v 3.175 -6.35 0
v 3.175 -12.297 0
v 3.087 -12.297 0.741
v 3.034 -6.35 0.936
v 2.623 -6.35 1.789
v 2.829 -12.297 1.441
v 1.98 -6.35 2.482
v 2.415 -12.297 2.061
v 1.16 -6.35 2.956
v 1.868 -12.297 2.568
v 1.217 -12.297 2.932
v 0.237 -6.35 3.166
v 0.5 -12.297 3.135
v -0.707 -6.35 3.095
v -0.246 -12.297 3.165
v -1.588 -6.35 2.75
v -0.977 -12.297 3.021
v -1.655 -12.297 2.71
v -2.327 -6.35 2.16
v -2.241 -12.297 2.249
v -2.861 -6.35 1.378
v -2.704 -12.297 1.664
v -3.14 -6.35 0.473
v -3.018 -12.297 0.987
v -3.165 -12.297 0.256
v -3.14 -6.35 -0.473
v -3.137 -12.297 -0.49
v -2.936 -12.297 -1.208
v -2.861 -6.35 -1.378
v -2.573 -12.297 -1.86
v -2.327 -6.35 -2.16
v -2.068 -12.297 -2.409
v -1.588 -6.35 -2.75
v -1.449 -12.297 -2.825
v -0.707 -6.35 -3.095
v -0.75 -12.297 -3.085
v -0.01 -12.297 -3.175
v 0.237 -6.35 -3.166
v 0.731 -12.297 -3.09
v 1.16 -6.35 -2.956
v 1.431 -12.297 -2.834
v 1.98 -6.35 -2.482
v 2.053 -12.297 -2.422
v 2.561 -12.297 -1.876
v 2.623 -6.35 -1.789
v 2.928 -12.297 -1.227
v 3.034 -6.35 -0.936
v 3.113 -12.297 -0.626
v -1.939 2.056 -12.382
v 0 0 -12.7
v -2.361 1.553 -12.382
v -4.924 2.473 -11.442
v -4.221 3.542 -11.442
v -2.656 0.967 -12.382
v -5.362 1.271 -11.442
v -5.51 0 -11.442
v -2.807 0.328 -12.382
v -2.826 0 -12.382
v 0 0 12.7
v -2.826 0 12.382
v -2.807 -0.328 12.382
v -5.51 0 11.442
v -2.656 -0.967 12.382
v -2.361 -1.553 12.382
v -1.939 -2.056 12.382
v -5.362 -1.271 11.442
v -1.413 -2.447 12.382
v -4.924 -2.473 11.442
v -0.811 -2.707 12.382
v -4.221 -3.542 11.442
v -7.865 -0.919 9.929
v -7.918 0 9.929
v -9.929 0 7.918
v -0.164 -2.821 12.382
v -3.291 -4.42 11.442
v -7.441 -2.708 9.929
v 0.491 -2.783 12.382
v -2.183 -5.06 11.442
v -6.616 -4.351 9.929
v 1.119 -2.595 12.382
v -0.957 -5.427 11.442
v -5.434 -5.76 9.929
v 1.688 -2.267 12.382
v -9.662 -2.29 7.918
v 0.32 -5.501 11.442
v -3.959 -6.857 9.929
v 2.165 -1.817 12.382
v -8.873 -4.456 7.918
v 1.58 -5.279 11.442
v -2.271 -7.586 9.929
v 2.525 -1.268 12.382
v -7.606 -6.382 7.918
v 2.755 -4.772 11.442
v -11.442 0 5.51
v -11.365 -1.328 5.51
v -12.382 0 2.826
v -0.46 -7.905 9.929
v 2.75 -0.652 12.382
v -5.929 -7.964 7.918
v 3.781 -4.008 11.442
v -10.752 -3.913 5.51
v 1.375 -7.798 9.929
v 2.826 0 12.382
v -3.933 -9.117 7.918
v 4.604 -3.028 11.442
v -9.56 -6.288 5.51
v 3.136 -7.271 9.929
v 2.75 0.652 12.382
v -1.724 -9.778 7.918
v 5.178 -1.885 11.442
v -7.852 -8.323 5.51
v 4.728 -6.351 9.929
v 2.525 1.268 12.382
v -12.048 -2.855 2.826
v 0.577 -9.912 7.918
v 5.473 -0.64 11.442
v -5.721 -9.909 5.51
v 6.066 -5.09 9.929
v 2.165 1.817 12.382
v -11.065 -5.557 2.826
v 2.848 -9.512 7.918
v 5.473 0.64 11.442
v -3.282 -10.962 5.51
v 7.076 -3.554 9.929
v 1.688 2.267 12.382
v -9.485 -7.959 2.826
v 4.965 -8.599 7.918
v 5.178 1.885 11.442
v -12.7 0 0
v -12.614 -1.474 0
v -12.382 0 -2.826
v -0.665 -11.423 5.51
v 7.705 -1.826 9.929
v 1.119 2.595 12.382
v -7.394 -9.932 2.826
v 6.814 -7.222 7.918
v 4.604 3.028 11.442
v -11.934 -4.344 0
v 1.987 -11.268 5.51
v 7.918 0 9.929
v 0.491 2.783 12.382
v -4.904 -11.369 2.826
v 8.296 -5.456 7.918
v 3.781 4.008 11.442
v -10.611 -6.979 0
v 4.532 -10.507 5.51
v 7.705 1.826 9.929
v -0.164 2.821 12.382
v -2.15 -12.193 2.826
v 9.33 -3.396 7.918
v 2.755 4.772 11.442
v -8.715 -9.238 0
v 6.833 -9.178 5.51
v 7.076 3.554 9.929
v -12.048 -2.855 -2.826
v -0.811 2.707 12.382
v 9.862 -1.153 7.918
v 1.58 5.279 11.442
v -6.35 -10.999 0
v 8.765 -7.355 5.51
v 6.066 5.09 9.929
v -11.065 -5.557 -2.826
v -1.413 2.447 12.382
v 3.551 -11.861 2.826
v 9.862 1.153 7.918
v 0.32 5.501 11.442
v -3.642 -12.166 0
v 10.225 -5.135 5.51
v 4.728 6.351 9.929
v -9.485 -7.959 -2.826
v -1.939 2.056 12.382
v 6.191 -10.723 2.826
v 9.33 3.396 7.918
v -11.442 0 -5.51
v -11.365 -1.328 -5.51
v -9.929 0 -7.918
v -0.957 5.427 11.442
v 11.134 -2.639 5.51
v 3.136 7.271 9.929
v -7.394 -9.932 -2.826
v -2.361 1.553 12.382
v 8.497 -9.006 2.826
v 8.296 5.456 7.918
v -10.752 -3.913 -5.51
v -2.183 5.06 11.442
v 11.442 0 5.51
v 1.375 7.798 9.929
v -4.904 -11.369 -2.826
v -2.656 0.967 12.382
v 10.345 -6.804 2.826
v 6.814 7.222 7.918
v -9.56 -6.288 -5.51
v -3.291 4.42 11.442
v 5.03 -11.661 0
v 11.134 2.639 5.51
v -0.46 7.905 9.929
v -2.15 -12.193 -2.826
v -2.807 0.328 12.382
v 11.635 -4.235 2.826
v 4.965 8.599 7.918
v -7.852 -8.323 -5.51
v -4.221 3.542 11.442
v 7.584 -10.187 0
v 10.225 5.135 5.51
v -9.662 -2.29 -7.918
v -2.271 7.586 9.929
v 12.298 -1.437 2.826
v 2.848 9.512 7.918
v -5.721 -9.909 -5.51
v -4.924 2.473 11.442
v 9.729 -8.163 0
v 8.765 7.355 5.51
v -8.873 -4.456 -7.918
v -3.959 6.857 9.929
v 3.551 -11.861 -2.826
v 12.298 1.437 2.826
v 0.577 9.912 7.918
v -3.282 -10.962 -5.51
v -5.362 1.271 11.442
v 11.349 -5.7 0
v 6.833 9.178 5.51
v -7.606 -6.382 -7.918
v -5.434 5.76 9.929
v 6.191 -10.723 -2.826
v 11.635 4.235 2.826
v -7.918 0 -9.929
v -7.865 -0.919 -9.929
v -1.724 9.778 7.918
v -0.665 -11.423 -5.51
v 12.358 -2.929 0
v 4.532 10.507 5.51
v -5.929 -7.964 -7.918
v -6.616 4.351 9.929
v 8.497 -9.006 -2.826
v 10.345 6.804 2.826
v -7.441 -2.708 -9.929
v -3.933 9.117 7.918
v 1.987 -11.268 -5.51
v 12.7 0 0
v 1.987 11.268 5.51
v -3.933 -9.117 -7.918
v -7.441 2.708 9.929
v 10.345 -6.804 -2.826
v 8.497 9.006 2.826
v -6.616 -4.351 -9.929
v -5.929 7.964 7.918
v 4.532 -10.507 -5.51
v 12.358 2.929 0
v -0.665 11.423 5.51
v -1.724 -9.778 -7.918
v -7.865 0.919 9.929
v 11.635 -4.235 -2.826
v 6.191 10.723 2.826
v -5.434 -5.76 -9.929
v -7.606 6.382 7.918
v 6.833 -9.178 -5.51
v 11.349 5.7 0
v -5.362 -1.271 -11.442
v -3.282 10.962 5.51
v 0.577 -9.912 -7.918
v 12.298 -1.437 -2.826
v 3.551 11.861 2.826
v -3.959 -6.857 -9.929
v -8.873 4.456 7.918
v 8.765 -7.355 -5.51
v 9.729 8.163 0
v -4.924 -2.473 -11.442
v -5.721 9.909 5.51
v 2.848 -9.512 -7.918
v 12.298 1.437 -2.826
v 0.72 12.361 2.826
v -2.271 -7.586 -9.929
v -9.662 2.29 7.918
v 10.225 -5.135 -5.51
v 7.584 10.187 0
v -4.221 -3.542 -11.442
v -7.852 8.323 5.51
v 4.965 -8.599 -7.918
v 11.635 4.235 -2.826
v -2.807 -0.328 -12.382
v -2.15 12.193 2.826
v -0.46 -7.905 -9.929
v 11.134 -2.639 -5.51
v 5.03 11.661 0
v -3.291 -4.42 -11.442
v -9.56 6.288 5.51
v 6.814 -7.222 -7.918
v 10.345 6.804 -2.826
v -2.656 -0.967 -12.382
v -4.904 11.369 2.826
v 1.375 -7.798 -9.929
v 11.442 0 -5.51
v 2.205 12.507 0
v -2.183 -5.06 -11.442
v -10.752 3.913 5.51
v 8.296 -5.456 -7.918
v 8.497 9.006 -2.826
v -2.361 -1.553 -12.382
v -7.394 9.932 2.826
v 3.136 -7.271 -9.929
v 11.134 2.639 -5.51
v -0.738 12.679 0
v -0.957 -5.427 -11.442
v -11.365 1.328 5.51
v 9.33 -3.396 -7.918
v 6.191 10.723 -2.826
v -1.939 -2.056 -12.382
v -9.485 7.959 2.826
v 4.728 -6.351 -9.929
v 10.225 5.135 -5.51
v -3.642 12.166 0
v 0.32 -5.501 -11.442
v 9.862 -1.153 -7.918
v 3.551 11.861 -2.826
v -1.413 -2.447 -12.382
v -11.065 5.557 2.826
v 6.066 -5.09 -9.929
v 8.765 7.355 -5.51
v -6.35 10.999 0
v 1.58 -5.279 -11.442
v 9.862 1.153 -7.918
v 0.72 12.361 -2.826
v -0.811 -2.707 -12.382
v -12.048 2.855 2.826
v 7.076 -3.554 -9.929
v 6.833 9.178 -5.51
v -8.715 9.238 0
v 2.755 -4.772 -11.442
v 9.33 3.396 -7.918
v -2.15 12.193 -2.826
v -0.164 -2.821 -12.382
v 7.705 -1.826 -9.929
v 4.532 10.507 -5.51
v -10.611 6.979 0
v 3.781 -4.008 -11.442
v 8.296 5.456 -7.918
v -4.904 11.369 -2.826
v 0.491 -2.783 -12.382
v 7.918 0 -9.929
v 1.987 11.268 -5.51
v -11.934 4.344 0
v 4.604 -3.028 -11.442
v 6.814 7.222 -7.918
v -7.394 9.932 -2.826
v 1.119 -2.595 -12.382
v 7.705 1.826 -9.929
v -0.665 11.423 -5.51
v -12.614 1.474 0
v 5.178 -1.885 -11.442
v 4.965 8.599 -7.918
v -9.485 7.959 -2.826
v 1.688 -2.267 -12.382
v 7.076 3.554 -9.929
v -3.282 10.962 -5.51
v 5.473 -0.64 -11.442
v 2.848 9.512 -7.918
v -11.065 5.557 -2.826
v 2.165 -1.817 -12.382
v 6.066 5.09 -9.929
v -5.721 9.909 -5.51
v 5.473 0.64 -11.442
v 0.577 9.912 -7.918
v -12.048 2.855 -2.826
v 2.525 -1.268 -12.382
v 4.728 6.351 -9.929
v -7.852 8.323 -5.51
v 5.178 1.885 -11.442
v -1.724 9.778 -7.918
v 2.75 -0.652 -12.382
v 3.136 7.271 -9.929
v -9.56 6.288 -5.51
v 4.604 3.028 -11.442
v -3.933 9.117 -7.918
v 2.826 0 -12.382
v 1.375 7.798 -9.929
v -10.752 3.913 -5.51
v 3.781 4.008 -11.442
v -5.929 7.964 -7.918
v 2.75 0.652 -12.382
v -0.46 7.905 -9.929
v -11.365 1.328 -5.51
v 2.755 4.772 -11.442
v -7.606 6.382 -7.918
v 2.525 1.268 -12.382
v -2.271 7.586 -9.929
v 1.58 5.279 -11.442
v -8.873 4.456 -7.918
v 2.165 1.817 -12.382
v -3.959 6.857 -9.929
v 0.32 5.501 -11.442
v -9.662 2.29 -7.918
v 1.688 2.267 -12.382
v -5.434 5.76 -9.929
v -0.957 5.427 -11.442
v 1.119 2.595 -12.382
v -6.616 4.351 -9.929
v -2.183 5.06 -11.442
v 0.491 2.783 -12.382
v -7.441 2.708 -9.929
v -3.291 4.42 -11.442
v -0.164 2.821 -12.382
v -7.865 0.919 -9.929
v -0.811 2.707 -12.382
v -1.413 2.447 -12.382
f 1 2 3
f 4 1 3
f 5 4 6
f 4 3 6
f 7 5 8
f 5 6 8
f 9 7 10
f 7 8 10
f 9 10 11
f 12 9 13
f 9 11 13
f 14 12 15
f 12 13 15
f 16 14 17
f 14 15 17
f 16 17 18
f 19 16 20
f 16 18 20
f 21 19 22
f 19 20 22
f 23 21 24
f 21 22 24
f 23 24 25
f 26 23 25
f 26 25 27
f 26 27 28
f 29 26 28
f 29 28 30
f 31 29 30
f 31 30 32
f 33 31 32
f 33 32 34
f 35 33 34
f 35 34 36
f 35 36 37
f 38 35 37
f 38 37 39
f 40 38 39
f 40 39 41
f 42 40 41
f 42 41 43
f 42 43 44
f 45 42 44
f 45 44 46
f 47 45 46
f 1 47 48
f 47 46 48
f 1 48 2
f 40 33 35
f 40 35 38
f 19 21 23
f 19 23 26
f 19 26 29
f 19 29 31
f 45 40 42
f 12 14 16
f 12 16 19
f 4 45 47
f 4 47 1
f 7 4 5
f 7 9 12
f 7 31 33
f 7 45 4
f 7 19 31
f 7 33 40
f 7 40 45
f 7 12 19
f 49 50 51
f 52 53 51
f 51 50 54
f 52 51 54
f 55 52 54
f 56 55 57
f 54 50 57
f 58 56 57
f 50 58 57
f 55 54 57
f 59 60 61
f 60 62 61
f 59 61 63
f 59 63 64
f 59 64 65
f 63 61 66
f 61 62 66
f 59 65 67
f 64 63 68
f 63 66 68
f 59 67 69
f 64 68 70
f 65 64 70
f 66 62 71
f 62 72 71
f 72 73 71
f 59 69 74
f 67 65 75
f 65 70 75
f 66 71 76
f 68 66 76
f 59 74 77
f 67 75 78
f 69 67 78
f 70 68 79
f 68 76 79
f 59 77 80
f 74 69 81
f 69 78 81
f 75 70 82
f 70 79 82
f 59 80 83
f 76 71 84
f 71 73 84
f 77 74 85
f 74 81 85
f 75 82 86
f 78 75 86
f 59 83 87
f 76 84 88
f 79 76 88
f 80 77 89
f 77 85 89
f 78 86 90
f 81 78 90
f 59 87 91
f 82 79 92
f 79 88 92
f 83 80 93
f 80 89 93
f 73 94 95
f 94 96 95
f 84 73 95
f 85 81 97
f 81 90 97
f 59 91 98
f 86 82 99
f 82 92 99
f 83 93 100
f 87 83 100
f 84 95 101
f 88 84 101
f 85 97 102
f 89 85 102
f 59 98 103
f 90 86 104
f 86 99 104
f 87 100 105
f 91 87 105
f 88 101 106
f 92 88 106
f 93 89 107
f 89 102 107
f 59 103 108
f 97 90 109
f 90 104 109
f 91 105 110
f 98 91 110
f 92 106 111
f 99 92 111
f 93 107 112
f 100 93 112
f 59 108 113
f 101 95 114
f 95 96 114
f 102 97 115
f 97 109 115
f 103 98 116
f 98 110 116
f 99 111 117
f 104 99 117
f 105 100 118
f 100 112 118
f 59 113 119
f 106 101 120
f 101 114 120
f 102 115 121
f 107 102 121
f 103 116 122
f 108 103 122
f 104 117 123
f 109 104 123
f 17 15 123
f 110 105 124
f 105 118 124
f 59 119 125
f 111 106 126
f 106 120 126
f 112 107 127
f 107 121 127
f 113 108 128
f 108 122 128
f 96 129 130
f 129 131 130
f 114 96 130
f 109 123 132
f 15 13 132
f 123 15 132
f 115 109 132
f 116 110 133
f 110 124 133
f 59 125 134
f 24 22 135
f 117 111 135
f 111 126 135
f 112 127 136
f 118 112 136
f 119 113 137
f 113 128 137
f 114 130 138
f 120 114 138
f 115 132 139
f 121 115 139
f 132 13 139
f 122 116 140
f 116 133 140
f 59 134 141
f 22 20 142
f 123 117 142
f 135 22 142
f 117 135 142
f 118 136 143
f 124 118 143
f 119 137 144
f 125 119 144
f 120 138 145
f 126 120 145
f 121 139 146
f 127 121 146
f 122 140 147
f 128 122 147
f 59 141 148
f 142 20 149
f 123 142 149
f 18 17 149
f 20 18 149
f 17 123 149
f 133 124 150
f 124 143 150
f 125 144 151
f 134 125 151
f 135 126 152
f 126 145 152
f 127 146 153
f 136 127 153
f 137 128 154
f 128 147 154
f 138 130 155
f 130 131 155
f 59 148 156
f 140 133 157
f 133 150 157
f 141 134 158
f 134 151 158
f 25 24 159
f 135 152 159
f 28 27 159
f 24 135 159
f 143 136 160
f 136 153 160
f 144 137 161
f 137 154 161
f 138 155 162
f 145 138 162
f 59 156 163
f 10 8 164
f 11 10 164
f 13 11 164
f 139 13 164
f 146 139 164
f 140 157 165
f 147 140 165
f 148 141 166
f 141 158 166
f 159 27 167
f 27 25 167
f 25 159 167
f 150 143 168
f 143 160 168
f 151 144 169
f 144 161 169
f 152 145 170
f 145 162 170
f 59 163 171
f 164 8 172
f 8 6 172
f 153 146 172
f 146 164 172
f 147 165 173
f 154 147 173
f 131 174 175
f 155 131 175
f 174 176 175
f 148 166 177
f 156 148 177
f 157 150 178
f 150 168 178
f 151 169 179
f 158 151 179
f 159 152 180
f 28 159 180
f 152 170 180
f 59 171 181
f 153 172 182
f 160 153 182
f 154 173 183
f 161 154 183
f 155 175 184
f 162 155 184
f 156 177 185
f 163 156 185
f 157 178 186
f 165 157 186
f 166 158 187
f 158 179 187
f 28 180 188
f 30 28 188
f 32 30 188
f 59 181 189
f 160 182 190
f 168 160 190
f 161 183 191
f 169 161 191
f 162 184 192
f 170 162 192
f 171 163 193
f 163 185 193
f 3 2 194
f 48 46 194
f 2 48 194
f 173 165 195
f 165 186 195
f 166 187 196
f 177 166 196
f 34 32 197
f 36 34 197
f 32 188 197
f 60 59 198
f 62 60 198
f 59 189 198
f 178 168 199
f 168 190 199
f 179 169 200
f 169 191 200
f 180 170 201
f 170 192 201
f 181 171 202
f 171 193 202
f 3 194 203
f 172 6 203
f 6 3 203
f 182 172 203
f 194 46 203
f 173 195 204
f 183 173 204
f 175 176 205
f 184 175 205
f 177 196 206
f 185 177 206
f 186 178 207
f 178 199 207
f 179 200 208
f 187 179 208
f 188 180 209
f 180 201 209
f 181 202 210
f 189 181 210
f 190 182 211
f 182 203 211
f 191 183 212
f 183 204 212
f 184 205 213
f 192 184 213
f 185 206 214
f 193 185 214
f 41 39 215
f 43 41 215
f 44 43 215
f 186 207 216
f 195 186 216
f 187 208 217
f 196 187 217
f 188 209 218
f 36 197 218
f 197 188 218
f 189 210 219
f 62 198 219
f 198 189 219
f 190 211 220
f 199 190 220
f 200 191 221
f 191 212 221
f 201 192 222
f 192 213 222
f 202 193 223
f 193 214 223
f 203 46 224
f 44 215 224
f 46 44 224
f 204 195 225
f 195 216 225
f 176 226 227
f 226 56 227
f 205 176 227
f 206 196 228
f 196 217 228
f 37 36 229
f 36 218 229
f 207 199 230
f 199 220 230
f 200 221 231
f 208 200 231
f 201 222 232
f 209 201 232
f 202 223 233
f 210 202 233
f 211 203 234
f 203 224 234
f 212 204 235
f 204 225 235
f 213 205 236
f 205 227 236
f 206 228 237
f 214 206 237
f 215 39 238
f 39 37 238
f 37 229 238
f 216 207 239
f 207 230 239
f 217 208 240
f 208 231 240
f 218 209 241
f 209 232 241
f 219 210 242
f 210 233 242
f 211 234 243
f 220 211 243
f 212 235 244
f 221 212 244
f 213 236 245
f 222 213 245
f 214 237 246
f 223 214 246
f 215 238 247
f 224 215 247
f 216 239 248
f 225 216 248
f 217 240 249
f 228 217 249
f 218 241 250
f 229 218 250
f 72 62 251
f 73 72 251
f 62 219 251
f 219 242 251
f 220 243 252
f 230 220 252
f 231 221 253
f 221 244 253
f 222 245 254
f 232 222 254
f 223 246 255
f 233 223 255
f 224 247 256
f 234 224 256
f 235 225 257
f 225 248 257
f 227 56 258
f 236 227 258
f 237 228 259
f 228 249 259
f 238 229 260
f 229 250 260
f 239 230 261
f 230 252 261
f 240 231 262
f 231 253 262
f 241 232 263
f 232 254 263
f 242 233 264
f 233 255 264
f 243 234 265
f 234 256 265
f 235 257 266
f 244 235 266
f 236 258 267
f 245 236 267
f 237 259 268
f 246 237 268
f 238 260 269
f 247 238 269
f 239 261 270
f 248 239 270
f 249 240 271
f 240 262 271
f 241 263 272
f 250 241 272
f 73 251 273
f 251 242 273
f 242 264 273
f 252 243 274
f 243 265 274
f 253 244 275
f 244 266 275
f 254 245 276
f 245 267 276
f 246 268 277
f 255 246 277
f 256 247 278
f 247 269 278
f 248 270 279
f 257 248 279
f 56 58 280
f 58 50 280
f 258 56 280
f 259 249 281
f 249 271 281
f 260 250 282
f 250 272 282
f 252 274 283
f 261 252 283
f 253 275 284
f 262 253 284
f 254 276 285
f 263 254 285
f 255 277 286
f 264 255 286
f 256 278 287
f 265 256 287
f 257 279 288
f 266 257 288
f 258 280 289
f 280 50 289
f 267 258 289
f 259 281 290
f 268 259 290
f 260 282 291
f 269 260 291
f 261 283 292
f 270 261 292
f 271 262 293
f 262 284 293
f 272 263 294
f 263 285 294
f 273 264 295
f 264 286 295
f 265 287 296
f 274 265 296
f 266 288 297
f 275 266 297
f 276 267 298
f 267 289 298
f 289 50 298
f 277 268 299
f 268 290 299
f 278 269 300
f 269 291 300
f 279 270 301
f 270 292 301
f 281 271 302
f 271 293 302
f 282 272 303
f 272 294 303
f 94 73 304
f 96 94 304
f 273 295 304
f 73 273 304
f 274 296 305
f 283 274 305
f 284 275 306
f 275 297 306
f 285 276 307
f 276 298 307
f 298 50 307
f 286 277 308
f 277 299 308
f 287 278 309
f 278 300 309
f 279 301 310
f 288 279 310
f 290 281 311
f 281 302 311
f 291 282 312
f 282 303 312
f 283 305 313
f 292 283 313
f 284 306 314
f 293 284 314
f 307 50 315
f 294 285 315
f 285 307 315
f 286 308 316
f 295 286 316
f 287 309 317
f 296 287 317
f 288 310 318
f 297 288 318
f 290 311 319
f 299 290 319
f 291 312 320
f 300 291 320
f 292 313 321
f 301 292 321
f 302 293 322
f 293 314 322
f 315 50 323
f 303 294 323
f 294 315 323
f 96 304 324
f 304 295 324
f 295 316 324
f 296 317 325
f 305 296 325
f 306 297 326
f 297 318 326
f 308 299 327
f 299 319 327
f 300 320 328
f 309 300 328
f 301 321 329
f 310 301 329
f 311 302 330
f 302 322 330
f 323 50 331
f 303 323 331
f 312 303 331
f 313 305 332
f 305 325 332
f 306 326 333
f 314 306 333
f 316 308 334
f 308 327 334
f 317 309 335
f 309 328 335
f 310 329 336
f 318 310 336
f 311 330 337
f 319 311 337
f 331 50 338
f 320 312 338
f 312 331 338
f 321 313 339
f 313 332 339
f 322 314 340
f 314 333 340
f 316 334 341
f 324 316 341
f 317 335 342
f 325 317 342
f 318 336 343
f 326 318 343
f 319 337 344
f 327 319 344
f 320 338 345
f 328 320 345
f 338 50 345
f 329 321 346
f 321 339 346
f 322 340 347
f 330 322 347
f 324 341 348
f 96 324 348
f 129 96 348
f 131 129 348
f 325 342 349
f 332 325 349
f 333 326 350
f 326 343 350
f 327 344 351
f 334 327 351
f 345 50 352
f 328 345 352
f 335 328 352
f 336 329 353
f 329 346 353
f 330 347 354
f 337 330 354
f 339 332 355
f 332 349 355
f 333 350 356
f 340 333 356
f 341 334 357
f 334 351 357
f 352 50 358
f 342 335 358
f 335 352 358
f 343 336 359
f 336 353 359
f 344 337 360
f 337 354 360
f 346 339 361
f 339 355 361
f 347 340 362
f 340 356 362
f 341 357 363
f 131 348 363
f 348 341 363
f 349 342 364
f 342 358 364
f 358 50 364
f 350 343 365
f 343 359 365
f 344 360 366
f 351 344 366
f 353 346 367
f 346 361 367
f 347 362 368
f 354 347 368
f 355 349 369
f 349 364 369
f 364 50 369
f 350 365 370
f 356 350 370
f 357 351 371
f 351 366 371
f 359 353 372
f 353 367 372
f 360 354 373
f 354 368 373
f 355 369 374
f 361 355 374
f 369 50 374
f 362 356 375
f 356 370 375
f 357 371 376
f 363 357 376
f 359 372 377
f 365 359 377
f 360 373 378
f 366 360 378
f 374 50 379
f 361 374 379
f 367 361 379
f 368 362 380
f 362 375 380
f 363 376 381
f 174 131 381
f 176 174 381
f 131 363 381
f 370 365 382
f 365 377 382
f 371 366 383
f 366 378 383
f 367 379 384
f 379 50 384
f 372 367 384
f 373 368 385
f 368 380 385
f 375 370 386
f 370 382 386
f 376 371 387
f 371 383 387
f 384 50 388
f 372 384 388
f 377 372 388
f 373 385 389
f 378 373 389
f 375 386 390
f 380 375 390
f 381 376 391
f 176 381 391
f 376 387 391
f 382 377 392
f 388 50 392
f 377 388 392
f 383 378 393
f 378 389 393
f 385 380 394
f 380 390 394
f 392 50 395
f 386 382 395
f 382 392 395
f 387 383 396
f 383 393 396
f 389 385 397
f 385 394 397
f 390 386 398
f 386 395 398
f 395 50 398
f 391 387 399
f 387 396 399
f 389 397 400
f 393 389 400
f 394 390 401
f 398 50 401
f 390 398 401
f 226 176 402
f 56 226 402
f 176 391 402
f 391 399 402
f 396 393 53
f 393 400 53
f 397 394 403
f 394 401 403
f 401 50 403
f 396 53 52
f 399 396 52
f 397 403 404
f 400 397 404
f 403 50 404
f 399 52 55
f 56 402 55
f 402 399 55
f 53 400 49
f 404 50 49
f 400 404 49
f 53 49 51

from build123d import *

# Parameters (mm, degrees)
F4_R     = 3.175
F5_DEPTH = 6.35
F7_R     = 3.175
F8_DEPTH = 9.525


with BuildPart() as f2:
    # F0 (on Front) → F2 (revolve)
    with BuildSketch(Plane.XZ):
        with BuildLine():
            Line((0, -12.7), (0, 12.7))
            ThreePointArc((0, 12.7), (-12.7, 0), (0, -12.7))
        make_face()
    revolve(axis=Axis((0, 0, 0), (0, 0, 1)))

    # F4 (on offset) → F5 (cut)
    with BuildSketch(Plane.XZ.offset(12.7)):
        Circle(F4_R)
    extrude(amount=-F5_DEPTH, mode=Mode.SUBTRACT)


with BuildPart() as f8:
    # F7 (on offset) → F8 (new body)
    with BuildSketch(Plane.XZ.offset(-12.7)):
        Circle(F7_R)
    extrude(amount=F8_DEPTH)


solid = f2.part
